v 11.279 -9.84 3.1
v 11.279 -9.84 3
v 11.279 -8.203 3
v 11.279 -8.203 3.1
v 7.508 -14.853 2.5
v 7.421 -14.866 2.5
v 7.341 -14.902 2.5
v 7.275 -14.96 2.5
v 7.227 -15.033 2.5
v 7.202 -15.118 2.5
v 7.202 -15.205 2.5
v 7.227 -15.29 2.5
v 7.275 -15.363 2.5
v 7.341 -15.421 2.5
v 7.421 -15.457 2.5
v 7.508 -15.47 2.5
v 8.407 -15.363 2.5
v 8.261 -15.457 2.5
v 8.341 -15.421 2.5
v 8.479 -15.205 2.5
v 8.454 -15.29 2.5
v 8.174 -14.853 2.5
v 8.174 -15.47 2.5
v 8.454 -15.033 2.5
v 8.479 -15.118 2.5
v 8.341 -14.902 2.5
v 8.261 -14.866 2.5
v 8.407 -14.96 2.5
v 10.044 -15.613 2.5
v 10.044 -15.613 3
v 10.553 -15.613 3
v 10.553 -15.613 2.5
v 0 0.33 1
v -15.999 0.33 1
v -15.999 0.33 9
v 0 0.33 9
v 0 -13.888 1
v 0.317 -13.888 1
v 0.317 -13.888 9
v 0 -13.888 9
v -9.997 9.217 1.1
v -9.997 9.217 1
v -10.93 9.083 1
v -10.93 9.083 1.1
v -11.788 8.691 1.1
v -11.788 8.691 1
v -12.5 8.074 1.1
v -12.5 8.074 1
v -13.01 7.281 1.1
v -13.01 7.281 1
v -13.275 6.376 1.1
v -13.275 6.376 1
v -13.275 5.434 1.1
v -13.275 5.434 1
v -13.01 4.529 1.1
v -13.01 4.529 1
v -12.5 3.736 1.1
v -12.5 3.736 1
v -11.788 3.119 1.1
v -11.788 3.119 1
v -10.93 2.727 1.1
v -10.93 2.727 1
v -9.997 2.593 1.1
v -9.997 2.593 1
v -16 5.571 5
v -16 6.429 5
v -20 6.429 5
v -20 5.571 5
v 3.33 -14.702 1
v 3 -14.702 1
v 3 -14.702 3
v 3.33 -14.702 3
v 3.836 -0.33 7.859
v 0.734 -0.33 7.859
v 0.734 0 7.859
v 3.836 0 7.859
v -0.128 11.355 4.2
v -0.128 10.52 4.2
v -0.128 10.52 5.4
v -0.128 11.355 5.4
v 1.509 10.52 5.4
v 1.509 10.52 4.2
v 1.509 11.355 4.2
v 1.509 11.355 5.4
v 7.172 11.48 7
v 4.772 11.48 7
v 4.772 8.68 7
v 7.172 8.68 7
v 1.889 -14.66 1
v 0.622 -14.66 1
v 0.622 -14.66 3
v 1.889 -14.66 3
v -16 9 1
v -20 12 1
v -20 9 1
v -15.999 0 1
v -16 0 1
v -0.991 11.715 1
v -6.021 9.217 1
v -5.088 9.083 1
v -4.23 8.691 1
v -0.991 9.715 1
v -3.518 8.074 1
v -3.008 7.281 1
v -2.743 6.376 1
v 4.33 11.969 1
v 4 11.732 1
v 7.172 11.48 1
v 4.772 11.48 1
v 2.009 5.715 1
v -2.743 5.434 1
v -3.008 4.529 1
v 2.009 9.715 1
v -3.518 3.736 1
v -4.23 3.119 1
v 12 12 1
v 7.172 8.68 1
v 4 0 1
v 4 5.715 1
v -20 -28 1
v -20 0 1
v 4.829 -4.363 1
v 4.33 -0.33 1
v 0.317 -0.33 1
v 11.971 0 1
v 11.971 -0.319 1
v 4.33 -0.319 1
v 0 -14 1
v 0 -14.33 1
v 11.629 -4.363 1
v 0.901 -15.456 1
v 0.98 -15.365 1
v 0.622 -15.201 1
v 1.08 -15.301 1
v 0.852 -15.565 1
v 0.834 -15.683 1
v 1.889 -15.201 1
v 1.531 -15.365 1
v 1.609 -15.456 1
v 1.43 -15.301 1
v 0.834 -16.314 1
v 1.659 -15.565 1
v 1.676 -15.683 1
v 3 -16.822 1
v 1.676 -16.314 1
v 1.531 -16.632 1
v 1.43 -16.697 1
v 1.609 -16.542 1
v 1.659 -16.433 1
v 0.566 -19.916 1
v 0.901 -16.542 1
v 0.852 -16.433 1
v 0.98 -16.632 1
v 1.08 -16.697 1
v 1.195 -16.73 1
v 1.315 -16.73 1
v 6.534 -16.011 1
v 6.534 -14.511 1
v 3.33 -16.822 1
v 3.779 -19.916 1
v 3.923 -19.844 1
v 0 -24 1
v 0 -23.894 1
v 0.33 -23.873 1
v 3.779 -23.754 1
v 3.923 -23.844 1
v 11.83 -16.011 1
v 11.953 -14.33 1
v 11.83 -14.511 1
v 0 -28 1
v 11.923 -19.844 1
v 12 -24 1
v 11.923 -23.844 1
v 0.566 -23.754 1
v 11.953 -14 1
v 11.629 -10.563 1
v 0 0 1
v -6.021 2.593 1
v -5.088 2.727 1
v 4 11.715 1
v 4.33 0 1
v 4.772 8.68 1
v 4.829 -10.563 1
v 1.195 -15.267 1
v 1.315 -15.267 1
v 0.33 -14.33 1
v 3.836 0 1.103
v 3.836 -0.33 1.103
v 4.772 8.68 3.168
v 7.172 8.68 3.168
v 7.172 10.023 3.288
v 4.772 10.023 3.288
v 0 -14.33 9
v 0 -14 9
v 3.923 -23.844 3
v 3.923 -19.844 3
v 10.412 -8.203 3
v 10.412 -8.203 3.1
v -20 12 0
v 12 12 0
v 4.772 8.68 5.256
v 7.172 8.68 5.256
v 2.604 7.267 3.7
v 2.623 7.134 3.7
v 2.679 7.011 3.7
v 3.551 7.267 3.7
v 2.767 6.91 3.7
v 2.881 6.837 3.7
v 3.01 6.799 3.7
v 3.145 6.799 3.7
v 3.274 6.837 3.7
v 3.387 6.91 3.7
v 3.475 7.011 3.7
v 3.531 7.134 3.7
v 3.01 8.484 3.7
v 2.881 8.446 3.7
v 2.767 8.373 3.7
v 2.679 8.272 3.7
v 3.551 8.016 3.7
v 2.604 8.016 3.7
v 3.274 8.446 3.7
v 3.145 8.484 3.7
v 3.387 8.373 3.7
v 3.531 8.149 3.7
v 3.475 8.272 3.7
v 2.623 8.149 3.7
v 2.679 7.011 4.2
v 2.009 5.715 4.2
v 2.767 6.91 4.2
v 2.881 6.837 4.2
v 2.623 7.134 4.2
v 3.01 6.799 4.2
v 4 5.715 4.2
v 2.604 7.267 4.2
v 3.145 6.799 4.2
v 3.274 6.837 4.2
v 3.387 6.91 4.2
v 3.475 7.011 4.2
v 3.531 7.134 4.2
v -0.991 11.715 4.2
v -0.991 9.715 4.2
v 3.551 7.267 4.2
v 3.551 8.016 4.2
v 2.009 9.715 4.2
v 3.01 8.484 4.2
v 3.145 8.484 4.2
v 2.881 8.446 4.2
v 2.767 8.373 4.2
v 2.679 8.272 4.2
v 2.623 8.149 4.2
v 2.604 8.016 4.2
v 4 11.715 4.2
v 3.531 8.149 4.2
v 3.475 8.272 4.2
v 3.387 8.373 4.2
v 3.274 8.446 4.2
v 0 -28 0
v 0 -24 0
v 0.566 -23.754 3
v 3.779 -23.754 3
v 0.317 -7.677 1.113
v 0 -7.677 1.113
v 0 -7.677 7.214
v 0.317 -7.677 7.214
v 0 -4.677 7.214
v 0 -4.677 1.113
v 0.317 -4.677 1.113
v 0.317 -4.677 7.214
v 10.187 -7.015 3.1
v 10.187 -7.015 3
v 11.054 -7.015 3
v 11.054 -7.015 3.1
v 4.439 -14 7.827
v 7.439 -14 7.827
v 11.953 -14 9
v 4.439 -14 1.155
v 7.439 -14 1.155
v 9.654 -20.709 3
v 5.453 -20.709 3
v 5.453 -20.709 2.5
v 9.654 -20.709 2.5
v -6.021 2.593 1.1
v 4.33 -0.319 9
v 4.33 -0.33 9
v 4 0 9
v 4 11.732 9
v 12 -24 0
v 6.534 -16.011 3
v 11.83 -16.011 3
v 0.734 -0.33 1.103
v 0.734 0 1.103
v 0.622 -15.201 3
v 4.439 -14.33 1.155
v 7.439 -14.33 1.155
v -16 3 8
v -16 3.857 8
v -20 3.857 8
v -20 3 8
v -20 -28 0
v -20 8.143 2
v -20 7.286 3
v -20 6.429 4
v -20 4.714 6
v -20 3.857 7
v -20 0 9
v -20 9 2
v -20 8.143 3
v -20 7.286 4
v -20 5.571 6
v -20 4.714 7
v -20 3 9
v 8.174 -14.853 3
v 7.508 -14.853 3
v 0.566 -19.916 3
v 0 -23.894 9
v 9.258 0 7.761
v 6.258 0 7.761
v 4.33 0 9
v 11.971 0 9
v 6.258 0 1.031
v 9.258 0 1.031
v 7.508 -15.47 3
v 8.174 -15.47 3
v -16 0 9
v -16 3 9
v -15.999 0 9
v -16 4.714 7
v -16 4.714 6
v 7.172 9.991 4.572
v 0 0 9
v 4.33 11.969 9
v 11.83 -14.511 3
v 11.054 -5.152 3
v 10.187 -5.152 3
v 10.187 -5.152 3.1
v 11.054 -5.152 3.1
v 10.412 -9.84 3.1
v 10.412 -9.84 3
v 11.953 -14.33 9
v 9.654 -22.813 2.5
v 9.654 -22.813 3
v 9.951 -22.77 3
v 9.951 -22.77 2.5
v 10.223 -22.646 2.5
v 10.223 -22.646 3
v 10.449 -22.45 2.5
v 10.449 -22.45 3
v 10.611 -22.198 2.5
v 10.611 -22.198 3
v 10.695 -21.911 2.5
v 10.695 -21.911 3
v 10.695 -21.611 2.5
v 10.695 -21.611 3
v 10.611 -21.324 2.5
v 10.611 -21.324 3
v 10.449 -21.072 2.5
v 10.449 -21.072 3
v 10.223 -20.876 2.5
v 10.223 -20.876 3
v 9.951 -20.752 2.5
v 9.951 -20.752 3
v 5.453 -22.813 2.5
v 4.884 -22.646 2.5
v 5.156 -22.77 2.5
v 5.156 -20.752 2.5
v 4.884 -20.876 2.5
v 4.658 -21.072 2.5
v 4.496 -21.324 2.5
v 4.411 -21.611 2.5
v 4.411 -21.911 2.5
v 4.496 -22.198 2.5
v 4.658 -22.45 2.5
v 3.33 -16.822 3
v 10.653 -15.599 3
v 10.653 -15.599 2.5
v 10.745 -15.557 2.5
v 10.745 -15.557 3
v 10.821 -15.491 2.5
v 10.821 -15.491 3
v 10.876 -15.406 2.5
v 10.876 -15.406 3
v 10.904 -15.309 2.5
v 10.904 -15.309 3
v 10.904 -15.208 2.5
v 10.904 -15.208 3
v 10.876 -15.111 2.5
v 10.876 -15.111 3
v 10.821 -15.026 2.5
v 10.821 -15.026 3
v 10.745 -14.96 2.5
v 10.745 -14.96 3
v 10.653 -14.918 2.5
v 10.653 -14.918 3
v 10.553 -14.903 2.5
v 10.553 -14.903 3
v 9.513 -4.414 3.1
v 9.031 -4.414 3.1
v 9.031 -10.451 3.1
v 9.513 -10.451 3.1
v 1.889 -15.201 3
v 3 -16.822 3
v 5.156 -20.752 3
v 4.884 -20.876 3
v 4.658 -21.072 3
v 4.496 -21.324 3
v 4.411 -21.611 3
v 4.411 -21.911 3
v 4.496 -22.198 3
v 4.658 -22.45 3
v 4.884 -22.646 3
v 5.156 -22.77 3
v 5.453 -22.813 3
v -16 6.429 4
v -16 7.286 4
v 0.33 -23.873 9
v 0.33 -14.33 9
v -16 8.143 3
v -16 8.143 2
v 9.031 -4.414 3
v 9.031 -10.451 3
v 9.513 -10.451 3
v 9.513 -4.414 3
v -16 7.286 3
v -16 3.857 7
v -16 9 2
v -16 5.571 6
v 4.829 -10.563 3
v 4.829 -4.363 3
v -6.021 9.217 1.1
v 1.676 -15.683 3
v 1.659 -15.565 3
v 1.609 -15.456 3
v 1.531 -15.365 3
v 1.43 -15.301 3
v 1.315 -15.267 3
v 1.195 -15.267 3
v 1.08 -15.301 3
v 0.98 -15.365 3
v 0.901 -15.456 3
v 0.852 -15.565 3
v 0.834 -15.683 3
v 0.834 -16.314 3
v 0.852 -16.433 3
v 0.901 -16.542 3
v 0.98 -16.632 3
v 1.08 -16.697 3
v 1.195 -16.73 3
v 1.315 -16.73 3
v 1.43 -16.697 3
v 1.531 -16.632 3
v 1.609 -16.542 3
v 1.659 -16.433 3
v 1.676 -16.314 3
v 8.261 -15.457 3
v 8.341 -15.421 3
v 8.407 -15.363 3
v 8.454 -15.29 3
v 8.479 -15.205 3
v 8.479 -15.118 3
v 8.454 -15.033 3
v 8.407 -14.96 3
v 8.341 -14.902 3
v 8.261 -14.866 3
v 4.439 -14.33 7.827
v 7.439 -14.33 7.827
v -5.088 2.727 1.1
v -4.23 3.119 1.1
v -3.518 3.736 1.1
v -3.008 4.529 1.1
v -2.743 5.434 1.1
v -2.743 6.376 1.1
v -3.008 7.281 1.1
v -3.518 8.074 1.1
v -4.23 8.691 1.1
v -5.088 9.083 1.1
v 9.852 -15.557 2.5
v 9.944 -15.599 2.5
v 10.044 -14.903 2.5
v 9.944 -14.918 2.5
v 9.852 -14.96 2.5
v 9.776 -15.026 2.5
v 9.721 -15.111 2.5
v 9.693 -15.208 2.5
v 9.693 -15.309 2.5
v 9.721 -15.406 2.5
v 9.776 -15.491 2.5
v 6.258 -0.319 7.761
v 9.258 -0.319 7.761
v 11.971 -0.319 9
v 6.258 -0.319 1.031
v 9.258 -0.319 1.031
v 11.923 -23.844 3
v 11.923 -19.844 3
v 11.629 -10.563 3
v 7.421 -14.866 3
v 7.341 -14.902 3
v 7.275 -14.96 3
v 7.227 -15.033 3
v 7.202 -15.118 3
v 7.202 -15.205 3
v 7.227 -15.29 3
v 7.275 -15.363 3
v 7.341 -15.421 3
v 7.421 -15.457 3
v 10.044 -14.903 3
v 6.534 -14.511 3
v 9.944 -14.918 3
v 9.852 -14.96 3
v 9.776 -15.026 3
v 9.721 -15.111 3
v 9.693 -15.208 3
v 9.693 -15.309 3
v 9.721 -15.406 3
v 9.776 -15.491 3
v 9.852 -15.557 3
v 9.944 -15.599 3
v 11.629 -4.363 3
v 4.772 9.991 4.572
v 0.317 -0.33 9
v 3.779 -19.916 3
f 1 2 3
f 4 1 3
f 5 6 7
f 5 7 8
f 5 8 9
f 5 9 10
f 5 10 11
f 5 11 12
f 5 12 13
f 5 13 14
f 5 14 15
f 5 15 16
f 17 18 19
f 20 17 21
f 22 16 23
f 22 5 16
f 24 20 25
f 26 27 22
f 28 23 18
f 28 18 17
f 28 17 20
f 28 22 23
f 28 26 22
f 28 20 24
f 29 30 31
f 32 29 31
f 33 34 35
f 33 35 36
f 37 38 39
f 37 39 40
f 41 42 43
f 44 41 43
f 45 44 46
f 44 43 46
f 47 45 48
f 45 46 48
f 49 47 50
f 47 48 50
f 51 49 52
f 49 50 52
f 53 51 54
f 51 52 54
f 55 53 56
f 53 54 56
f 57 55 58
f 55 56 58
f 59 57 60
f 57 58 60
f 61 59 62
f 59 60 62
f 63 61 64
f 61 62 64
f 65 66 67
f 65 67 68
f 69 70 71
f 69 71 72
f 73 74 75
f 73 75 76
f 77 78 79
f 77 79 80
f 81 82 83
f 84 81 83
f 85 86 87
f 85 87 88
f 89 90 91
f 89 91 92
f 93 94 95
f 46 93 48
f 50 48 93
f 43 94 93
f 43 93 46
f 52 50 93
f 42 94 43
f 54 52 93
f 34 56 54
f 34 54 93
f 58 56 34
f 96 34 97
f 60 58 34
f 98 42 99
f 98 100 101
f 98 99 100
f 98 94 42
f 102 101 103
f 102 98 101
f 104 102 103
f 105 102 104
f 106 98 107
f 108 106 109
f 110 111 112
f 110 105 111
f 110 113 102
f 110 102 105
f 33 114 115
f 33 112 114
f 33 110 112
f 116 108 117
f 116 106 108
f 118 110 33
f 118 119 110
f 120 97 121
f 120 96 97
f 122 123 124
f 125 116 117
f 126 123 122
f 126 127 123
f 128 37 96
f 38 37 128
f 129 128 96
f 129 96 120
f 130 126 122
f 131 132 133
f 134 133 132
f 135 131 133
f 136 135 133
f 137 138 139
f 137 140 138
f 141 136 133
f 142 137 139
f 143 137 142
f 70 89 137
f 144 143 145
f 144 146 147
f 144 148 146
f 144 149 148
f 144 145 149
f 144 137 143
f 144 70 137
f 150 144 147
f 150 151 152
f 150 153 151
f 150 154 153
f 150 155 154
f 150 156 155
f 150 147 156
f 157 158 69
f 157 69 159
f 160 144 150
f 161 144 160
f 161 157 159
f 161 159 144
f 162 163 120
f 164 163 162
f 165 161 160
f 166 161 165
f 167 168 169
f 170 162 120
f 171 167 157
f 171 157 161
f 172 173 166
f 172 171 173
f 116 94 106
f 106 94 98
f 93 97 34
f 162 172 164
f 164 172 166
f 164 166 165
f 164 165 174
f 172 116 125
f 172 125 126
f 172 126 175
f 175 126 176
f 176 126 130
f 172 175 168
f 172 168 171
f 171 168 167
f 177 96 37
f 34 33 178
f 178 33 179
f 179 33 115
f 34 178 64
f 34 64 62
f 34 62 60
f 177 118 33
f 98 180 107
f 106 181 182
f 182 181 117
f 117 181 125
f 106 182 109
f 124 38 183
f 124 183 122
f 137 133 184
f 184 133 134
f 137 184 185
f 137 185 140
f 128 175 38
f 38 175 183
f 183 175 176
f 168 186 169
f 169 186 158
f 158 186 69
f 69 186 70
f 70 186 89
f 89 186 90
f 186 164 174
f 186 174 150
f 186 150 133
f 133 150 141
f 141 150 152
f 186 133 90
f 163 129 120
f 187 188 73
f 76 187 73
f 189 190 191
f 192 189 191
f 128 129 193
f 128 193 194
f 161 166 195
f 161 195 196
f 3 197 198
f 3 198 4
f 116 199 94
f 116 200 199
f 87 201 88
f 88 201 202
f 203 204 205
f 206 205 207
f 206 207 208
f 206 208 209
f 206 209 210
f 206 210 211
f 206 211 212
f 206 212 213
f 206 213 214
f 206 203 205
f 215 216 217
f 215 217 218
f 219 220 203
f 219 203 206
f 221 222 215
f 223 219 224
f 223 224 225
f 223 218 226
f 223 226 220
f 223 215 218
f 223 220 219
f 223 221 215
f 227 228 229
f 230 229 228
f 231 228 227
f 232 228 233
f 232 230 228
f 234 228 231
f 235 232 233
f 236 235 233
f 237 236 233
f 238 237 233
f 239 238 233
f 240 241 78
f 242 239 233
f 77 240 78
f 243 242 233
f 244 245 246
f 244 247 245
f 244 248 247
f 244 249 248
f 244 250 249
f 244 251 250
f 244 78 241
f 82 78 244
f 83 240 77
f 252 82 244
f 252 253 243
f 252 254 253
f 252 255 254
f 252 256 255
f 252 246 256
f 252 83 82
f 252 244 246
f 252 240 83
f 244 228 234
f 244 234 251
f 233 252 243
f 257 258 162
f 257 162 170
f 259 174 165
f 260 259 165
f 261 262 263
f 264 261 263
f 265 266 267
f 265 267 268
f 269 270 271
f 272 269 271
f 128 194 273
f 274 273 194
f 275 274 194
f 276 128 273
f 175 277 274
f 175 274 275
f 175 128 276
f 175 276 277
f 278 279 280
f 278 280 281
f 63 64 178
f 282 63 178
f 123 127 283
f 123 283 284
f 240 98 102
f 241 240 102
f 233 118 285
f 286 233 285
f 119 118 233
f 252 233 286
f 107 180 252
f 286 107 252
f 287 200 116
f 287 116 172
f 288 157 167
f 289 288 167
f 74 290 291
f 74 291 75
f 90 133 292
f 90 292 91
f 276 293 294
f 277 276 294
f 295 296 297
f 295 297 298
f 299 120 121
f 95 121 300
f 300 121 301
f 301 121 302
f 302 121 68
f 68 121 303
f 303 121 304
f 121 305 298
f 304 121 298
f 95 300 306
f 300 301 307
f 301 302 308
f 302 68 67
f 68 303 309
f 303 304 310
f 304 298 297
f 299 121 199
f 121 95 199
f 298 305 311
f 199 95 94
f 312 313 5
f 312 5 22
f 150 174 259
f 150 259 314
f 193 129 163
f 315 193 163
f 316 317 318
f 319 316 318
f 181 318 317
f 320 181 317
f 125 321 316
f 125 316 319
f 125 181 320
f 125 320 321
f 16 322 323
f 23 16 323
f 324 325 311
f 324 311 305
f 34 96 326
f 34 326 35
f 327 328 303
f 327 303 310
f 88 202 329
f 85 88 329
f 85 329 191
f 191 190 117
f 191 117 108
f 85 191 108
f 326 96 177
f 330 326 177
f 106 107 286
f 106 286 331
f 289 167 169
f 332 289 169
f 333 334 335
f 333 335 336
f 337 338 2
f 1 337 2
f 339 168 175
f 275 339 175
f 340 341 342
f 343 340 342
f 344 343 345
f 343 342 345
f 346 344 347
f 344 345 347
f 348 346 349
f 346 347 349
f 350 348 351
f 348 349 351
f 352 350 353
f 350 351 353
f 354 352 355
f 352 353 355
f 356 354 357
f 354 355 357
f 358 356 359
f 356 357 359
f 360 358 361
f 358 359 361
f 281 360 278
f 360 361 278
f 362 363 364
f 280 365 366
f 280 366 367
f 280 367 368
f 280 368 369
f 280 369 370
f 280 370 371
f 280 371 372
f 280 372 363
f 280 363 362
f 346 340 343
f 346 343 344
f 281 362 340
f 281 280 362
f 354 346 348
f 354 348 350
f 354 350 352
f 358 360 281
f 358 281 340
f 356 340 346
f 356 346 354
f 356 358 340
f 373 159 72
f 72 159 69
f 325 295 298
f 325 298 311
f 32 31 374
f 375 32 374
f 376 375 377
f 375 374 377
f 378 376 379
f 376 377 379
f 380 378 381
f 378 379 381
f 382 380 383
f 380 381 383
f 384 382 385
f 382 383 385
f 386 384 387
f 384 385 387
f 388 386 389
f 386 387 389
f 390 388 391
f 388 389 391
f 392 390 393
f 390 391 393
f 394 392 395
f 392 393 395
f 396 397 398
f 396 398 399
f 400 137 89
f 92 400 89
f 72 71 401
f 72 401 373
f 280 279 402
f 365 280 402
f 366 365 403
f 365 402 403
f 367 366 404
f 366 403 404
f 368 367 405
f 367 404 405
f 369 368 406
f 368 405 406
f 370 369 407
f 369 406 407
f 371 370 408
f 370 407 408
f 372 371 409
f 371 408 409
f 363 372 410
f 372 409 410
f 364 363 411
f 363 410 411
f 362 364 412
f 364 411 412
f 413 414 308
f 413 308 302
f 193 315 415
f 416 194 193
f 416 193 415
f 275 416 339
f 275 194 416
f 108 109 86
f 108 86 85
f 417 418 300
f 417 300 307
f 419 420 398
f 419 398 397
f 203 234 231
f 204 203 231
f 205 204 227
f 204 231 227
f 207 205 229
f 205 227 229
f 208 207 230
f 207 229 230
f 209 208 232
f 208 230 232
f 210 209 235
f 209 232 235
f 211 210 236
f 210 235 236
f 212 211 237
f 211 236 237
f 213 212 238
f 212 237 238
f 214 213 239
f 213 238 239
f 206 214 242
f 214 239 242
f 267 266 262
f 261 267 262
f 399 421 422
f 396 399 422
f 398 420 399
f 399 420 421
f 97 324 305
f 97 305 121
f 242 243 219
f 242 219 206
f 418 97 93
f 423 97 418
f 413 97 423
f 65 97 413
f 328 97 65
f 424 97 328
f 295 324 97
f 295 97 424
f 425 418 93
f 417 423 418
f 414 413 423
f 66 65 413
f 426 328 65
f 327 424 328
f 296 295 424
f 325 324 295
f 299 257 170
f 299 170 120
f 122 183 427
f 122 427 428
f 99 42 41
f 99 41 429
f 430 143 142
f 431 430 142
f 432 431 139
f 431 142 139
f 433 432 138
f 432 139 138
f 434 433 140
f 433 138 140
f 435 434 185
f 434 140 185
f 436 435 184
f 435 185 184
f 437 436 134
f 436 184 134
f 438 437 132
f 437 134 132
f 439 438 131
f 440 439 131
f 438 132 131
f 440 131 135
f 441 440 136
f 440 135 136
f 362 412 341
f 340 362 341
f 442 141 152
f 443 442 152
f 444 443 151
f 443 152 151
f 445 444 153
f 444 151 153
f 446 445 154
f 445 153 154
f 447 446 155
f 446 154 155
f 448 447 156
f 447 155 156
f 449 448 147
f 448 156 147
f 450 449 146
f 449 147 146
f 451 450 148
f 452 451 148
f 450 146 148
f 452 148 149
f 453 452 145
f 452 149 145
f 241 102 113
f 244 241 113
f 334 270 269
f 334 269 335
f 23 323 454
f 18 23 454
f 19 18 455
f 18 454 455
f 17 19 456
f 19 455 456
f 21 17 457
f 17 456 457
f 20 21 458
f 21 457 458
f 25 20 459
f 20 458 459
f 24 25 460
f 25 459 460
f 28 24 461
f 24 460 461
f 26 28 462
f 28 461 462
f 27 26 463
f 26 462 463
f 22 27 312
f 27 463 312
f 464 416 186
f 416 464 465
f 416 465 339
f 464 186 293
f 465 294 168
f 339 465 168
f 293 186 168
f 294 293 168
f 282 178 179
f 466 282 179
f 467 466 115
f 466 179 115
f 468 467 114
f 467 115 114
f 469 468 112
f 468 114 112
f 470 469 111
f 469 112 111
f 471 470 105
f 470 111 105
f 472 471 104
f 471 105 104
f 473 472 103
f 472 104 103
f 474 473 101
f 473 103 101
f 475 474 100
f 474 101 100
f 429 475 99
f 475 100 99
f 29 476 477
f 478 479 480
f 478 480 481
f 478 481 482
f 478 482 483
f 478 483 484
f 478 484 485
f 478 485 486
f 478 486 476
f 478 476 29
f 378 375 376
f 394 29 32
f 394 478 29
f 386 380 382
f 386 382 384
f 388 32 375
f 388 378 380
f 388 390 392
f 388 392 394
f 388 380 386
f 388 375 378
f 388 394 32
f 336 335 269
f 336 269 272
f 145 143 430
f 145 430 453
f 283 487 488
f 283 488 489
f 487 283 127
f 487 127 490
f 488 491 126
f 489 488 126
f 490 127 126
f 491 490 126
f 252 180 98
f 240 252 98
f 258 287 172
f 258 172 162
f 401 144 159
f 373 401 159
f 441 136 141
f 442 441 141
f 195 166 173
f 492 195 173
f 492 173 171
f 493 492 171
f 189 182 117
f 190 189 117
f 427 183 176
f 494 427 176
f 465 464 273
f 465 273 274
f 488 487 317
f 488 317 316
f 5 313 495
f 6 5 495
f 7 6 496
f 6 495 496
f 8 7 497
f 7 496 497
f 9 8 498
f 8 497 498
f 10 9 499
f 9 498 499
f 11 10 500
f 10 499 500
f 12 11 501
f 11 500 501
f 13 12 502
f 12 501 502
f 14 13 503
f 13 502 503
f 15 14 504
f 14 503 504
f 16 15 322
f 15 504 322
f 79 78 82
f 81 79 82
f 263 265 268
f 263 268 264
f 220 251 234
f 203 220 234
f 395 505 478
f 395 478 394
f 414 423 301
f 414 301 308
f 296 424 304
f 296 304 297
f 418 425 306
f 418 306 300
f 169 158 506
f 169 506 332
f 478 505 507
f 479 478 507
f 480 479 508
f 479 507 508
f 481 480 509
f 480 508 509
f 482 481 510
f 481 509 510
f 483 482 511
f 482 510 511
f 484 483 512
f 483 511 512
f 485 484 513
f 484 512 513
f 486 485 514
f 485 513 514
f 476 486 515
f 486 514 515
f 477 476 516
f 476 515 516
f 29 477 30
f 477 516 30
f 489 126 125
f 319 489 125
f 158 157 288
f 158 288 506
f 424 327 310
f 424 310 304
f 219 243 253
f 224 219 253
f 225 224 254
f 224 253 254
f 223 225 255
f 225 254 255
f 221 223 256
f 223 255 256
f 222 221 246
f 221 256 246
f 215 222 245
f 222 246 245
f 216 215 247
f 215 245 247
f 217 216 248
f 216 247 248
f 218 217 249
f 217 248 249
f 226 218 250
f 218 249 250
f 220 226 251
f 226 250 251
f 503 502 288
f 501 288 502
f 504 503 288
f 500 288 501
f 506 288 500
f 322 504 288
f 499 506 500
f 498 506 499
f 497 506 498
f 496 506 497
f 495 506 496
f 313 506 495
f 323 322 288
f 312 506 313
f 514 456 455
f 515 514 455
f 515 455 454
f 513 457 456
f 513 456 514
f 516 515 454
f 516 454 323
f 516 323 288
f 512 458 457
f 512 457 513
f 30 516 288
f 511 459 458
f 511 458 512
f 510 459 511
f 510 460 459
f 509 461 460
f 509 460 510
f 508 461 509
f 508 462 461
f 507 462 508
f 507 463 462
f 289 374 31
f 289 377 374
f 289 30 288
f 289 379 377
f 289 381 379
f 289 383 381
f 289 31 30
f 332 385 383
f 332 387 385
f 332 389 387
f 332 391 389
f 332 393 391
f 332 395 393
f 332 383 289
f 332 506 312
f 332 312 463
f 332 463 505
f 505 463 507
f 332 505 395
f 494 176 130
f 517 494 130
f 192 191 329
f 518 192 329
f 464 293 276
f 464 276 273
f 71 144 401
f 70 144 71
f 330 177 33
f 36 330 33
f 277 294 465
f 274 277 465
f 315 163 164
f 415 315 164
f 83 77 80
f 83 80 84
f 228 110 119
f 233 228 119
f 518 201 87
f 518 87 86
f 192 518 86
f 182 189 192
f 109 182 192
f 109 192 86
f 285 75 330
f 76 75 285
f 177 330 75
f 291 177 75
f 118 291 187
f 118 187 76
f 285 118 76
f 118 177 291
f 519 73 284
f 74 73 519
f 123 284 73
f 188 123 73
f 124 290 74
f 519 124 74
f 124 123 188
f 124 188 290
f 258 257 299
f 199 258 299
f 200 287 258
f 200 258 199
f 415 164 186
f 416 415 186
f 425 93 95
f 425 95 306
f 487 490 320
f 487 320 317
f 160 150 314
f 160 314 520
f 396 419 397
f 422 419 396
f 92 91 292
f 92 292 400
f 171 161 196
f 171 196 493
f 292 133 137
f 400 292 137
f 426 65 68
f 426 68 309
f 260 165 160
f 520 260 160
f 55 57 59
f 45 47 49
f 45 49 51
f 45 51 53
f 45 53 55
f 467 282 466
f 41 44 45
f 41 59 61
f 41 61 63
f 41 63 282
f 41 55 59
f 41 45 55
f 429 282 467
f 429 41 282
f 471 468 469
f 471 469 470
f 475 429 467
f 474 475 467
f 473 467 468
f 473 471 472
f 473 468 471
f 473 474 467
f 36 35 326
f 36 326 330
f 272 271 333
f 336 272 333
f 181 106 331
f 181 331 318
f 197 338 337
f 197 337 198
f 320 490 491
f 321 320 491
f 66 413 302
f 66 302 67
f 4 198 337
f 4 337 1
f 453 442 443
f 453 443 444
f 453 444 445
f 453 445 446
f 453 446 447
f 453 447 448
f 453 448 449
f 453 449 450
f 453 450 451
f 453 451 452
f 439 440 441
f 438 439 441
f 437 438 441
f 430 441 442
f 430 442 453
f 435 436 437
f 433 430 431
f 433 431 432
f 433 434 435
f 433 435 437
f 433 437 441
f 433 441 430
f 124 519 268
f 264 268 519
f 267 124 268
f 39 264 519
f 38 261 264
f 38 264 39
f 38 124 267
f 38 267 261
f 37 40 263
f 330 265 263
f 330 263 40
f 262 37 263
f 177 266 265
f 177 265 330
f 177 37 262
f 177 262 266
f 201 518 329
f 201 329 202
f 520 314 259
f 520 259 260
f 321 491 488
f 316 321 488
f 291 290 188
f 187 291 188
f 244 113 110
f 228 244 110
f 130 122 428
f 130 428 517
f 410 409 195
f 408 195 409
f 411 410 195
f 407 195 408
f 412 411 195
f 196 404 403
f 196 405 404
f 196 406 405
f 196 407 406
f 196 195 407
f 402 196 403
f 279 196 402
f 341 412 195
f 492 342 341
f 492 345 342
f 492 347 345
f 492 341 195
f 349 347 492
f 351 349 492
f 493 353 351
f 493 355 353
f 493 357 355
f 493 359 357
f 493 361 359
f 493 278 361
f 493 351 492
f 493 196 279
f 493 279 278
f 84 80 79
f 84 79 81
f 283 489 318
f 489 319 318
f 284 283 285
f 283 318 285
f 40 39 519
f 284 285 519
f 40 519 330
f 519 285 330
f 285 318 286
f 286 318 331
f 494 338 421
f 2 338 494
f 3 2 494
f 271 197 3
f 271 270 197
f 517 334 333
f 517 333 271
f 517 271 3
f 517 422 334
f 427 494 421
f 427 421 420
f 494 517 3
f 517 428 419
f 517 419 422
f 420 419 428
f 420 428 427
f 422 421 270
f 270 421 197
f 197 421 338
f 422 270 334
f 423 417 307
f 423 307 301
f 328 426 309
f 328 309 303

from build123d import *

# Parameters (mm, degrees)
PAD_DEPTH       = 1
PAD004_DEPTH    = 8
PAD005_DEPTH    = 4
SKETCH014_W     = 7.729191
SKETCH014_H     = 0.31886
PAD006_DEPTH    = 8
SKETCH015_W     = 11.953097
SKETCH015_H     = 0.33
PAD007_DEPTH    = 8
SKETCH016_W     = 3
SKETCH016_H     = 6.672529
POCKET_DEPTH    = 5
SKETCH017_W     = 3.102198
SKETCH017_H     = 6.756484
POCKET001_DEPTH = 5
SKETCH018_W     = 15.99927
SKETCH018_H     = 0.33
PAD008_DEPTH    = 8
SKETCH020_W     = 3
SKETCH020_H     = 6.100988
POCKET002_DEPTH = 5
PAD009_DEPTH    = 8
SKETCH005_W     = 5.295486
SKETCH005_H     = 1.5
SKETCH005_W_2   = 8
SKETCH005_H_2   = 4
SKETCH005_W_3   = 3.212604
SKETCH005_H_3   = 3.838312
SKETCH005_W_4   = 1.267163
SKETCH005_H_4   = 0.540659
SKETCH005_W_5   = 0.33
SKETCH005_H_5   = 2.119946
PAD010_DEPTH    = 2
POCKET003_DEPTH = 0.5
SKETCH024_W     = 6.8
SKETCH024_H     = 6.2
PAD011_DEPTH    = 2
SKETCH025_W     = 2.4
SKETCH025_H     = 2.8
PAD012_DEPTH    = 6
POCKET004_DEPTH = 2.5
SKETCH028_W     = 3
SKETCH028_H     = 6.730199
POCKET005_DEPTH = 5
PAD013_DEPTH    = 3.2
POCKET006_DEPTH = 0.5
SKETCH031_W     = 1.637633
SKETCH031_H     = 0.834874
PAD014_DEPTH    = 1.2
PAD015_DEPTH    = 0.1
SKETCH033_W     = 0.866982
SKETCH033_H     = 1.862408
SKETCH033_W_2   = 0.866983
SKETCH033_H_2   = 1.637636
SKETCH033_W_3   = 0.481657
SKETCH033_H_3   = 6.036772
PAD016_DEPTH    = 0.1


with BuildPart() as part:
    # Sketch → Pad (new body)
    with BuildSketch(Plane.XY):
        Polygon((0, -28), (-20, -28), (-20, 0), (-16, 0), (-16, 12), (12, 12), (12, -24), (0, -24), align=None)
    extrude(amount=PAD_DEPTH)

    # Sketch007 → Pad004 (join)
    with BuildSketch(Plane.XY.offset(1)):
        Polygon((0.316723, -0.33), (0.316723, -13.888312), (0, -13.888312), (0, 0), (4, 0), (4, 11.732385), (4.33, 11.969152), (4.33, -0.33), align=None)
    extrude(amount=PAD004_DEPTH)

    # Sketch004 (on Face4 of Pad) → Pad005 (join)
    with BuildSketch(Plane(origin=(-16, 0, 0), x_dir=(0, -1, 0), z_dir=(-1, 0, 0))):
        Polygon((-12, 0), (-12, 1), (-9, 1), (-9, 2), (-8.142857, 2), (-8.142857, 3), (-7.285714, 3), (-7.285714, 4), (-6.428571, 4), (-6.428571, 5), (-5.571429, 5), (-5.571429, 6), (-4.714286, 6), (-4.714286, 7), (-3.857143, 7), (-3.857143, 8), (-3, 8), (-3, 9), (0, 9), (0, 0), align=None)
    extrude(amount=PAD005_DEPTH)

    # Sketch014 (on Face5 of Pad005) → Pad006 (join)
    with BuildSketch(Plane.XY.offset(1)):
        with Locations((8.106394, -0.15943)):
            Rectangle(SKETCH014_W, SKETCH014_H)
    extrude(amount=PAD006_DEPTH)

    # Sketch015 (on Face5 of Pad006) → Pad007 (join)
    with BuildSketch(Plane.XY.offset(1)):
        with Locations((5.976548, -14.165)):
            Rectangle(SKETCH015_W, SKETCH015_H)
    extrude(amount=PAD007_DEPTH)

    # Sketch016 (on Face16 of Pad007) → Pocket (cut)
    with BuildSketch(Plane.XZ.offset(14.33)):
        with Locations((5.939301, 4.490863)):
            Rectangle(SKETCH016_W, SKETCH016_H)
    extrude(amount=-POCKET_DEPTH, mode=Mode.SUBTRACT)

    # Sketch017 (on Face19 of Pocket) → Pocket001 (cut)
    with BuildSketch(Plane.XZ.offset(0.33)):
        with Locations((2.28487, 4.481079)):
            Rectangle(SKETCH017_W, SKETCH017_H)
    extrude(amount=-POCKET001_DEPTH, mode=Mode.SUBTRACT)

    # Sketch018 (on Face5 of Pocket001) → Pad008 (join)
    with BuildSketch(Plane.XY.offset(1)):
        with Locations((-7.999635, 0.165)):
            Rectangle(SKETCH018_W, SKETCH018_H)
    extrude(amount=PAD008_DEPTH)

    # Sketch020 (on Face20 of Pad008) → Pocket002 (cut)
    with BuildSketch(Plane(origin=(0, 0, 0), x_dir=(0, -1, 0), z_dir=(-1, 0, 0))):
        with Locations((6.176963, 4.163983)):
            Rectangle(SKETCH020_W, SKETCH020_H)
    extrude(amount=-POCKET002_DEPTH, mode=Mode.SUBTRACT)

    # Sketch021 (on Face5 of Pocket002) → Pad009 (join)
    with BuildSketch(Plane.XY.offset(1)):
        Polygon((0, -14.263546), (0, -23.894106), (0.33, -23.872581), (0.33, -14.263546), align=None)
    extrude(amount=PAD009_DEPTH)

    # Sketch005 (on Face5 of Pad009) → Pad010 (join)
    with BuildSketch(Plane.XY.offset(1)):
        with Locations((9.181875, -15.260856)):
            Rectangle(SKETCH005_W, SKETCH005_H)
        with Locations((7.922637, -21.844449)):
            Rectangle(SKETCH005_W_2, SKETCH005_H_2)
        with Locations((2.172653, -21.834947)):
            Rectangle(SKETCH005_W_3, SKETCH005_H_3)
        with BuildLine():
            ThreePointArc((1.67577, -15.683133), (1.255132, -15.262495), (0.834494, -15.683133))
            Line((0.834494, -15.683133), (0.834494, -16.314087))
            ThreePointArc((0.834494, -16.314087), (1.255132, -16.734725), (1.67577, -16.314087))
            Line((1.67577, -15.683133), (1.67577, -16.314087))
        make_face()
        with Locations((1.25517, -14.930792)):
            Rectangle(SKETCH005_W_4, SKETCH005_H_4)
        with Locations((3.165, -15.762285)):
            Rectangle(SKETCH005_W_5, SKETCH005_H_5)
    extrude(amount=PAD010_DEPTH)

    # Sketch010 (on Face79 of Pad010) → Pocket003 (cut)
    with BuildSketch(Plane.XY.offset(3)):
        with BuildLine():
            ThreePointArc((5.452506, -20.709412), (4.400786, -21.761133), (5.452506, -22.812854))
            Line((5.452506, -22.812854), (9.654259, -22.812854))
            ThreePointArc((9.654259, -22.812854), (10.70598, -21.761133), (9.654259, -20.709412))
            Line((5.452506, -20.709412), (9.654259, -20.709412))
        make_face()
        with BuildLine():
            ThreePointArc((7.507576, -14.85322), (7.199253, -15.161543), (7.507576, -15.469866))
            Line((7.507576, -15.469866), (8.173935, -15.469866))
            ThreePointArc((8.173935, -15.469866), (8.482258, -15.161543), (8.173935, -14.85322))
            Line((7.507576, -14.85322), (8.173935, -14.85322))
        make_face()
        with BuildLine():
            ThreePointArc((10.044301, -14.90339), (9.689296, -15.258395), (10.044301, -15.6134))
            Line((10.044301, -15.6134), (10.55301, -15.6134))
            ThreePointArc((10.55301, -15.6134), (10.908015, -15.258395), (10.55301, -14.90339))
            Line((10.044301, -14.90339), (10.55301, -14.90339))
        make_face()
    extrude(amount=-POCKET003_DEPTH, mode=Mode.SUBTRACT)

    # Sketch024 (on Face5 of Pocket003) → Pad011 (join)
    with BuildSketch(Plane.XY.offset(1)):
        with Locations((8.22879, -7.462824)):
            Rectangle(SKETCH024_W, SKETCH024_H)
    extrude(amount=PAD011_DEPTH)

    # Sketch025 (on Face5 of Pad011) → Pad012 (join)
    with BuildSketch(Plane.XY.offset(1)):
        with Locations((5.972474, 10.079884)):
            Rectangle(SKETCH025_W, SKETCH025_H)
    extrude(amount=PAD012_DEPTH)

    # Sketch026 (on Face63 of Pad012) → Pocket004 (cut)
    with BuildSketch(Plane.YZ.offset(7.172474)):
        Polygon((8.224654, 3.127523), (10.022843, 3.288076), (9.990732, 4.572494), (8.51365, 5.343146), align=None)
    extrude(amount=-POCKET004_DEPTH, mode=Mode.SUBTRACT)

    # Sketch028 (on Face59 of Pocket004) → Pocket005 (cut)
    with BuildSketch(Plane.XZ.offset(0.31886)):
        with Locations((7.757963, 4.395962)):
            Rectangle(SKETCH028_W, SKETCH028_H)
    extrude(amount=-POCKET005_DEPTH, mode=Mode.SUBTRACT)

    # Sketch029 (on Face5 of Pocket005) → Pad013 (join)
    with BuildSketch(Plane.XY.offset(1)):
        Polygon((-0.991208, 11.715413), (-0.991208, 9.715413), (2.008792, 9.715413), (2.008792, 5.715413), (4.008792, 5.715413), (4.008792, 11.715413), align=None)
    extrude(amount=PAD013_DEPTH)

    # Sketch030 (on Face115 of Pad013) → Pocket006 (cut)
    with BuildSketch(Plane.XY.offset(4.2)):
        with BuildLine():
            ThreePointArc((3.550535, 8.01575), (3.077208, 8.489077), (2.603881, 8.01575))
            Line((2.603881, 8.01575), (2.603881, 7.267244))
            ThreePointArc((2.603881, 7.267244), (3.077208, 6.793917), (3.550535, 7.267244))
            Line((3.550535, 8.01575), (3.550535, 7.267244))
        make_face()
    extrude(amount=-POCKET006_DEPTH, mode=Mode.SUBTRACT)

    # Sketch031 (on Face115 of Pocket006) → Pad014 (join)
    with BuildSketch(Plane.XY.offset(4.2)):
        with Locations((0.690656, 10.93792)):
            Rectangle(SKETCH031_W, SKETCH031_H)
    extrude(amount=PAD014_DEPTH)

    # Sketch032 (on Face5 of Pad014) → Pad015 (join)
    with BuildSketch(Plane.XY.offset(1)):
        with BuildLine():
            ThreePointArc((-9.997042, 9.217286), (-13.309208, 5.90512), (-9.997042, 2.592954))
            Line((-9.997042, 2.592954), (-6.021085, 2.592954))
            ThreePointArc((-6.021085, 2.592954), (-2.708919, 5.90512), (-6.021085, 9.217286))
            Line((-9.997042, 9.217286), (-6.021085, 9.217286))
        make_face()
    extrude(amount=PAD015_DEPTH)

    # Sketch033 (on Face109 of Pad015) → Pad016 (join)
    with BuildSketch(Plane.XY.offset(3)):
        with Locations((10.620443, -6.083477)):
            Rectangle(SKETCH033_W, SKETCH033_H)
        with Locations((10.845216, -9.021587)):
            Rectangle(SKETCH033_W_2, SKETCH033_H_2)
        with Locations((9.271801, -7.432117)):
            Rectangle(SKETCH033_W_3, SKETCH033_H_3)
    extrude(amount=PAD016_DEPTH)


solid = part.part
